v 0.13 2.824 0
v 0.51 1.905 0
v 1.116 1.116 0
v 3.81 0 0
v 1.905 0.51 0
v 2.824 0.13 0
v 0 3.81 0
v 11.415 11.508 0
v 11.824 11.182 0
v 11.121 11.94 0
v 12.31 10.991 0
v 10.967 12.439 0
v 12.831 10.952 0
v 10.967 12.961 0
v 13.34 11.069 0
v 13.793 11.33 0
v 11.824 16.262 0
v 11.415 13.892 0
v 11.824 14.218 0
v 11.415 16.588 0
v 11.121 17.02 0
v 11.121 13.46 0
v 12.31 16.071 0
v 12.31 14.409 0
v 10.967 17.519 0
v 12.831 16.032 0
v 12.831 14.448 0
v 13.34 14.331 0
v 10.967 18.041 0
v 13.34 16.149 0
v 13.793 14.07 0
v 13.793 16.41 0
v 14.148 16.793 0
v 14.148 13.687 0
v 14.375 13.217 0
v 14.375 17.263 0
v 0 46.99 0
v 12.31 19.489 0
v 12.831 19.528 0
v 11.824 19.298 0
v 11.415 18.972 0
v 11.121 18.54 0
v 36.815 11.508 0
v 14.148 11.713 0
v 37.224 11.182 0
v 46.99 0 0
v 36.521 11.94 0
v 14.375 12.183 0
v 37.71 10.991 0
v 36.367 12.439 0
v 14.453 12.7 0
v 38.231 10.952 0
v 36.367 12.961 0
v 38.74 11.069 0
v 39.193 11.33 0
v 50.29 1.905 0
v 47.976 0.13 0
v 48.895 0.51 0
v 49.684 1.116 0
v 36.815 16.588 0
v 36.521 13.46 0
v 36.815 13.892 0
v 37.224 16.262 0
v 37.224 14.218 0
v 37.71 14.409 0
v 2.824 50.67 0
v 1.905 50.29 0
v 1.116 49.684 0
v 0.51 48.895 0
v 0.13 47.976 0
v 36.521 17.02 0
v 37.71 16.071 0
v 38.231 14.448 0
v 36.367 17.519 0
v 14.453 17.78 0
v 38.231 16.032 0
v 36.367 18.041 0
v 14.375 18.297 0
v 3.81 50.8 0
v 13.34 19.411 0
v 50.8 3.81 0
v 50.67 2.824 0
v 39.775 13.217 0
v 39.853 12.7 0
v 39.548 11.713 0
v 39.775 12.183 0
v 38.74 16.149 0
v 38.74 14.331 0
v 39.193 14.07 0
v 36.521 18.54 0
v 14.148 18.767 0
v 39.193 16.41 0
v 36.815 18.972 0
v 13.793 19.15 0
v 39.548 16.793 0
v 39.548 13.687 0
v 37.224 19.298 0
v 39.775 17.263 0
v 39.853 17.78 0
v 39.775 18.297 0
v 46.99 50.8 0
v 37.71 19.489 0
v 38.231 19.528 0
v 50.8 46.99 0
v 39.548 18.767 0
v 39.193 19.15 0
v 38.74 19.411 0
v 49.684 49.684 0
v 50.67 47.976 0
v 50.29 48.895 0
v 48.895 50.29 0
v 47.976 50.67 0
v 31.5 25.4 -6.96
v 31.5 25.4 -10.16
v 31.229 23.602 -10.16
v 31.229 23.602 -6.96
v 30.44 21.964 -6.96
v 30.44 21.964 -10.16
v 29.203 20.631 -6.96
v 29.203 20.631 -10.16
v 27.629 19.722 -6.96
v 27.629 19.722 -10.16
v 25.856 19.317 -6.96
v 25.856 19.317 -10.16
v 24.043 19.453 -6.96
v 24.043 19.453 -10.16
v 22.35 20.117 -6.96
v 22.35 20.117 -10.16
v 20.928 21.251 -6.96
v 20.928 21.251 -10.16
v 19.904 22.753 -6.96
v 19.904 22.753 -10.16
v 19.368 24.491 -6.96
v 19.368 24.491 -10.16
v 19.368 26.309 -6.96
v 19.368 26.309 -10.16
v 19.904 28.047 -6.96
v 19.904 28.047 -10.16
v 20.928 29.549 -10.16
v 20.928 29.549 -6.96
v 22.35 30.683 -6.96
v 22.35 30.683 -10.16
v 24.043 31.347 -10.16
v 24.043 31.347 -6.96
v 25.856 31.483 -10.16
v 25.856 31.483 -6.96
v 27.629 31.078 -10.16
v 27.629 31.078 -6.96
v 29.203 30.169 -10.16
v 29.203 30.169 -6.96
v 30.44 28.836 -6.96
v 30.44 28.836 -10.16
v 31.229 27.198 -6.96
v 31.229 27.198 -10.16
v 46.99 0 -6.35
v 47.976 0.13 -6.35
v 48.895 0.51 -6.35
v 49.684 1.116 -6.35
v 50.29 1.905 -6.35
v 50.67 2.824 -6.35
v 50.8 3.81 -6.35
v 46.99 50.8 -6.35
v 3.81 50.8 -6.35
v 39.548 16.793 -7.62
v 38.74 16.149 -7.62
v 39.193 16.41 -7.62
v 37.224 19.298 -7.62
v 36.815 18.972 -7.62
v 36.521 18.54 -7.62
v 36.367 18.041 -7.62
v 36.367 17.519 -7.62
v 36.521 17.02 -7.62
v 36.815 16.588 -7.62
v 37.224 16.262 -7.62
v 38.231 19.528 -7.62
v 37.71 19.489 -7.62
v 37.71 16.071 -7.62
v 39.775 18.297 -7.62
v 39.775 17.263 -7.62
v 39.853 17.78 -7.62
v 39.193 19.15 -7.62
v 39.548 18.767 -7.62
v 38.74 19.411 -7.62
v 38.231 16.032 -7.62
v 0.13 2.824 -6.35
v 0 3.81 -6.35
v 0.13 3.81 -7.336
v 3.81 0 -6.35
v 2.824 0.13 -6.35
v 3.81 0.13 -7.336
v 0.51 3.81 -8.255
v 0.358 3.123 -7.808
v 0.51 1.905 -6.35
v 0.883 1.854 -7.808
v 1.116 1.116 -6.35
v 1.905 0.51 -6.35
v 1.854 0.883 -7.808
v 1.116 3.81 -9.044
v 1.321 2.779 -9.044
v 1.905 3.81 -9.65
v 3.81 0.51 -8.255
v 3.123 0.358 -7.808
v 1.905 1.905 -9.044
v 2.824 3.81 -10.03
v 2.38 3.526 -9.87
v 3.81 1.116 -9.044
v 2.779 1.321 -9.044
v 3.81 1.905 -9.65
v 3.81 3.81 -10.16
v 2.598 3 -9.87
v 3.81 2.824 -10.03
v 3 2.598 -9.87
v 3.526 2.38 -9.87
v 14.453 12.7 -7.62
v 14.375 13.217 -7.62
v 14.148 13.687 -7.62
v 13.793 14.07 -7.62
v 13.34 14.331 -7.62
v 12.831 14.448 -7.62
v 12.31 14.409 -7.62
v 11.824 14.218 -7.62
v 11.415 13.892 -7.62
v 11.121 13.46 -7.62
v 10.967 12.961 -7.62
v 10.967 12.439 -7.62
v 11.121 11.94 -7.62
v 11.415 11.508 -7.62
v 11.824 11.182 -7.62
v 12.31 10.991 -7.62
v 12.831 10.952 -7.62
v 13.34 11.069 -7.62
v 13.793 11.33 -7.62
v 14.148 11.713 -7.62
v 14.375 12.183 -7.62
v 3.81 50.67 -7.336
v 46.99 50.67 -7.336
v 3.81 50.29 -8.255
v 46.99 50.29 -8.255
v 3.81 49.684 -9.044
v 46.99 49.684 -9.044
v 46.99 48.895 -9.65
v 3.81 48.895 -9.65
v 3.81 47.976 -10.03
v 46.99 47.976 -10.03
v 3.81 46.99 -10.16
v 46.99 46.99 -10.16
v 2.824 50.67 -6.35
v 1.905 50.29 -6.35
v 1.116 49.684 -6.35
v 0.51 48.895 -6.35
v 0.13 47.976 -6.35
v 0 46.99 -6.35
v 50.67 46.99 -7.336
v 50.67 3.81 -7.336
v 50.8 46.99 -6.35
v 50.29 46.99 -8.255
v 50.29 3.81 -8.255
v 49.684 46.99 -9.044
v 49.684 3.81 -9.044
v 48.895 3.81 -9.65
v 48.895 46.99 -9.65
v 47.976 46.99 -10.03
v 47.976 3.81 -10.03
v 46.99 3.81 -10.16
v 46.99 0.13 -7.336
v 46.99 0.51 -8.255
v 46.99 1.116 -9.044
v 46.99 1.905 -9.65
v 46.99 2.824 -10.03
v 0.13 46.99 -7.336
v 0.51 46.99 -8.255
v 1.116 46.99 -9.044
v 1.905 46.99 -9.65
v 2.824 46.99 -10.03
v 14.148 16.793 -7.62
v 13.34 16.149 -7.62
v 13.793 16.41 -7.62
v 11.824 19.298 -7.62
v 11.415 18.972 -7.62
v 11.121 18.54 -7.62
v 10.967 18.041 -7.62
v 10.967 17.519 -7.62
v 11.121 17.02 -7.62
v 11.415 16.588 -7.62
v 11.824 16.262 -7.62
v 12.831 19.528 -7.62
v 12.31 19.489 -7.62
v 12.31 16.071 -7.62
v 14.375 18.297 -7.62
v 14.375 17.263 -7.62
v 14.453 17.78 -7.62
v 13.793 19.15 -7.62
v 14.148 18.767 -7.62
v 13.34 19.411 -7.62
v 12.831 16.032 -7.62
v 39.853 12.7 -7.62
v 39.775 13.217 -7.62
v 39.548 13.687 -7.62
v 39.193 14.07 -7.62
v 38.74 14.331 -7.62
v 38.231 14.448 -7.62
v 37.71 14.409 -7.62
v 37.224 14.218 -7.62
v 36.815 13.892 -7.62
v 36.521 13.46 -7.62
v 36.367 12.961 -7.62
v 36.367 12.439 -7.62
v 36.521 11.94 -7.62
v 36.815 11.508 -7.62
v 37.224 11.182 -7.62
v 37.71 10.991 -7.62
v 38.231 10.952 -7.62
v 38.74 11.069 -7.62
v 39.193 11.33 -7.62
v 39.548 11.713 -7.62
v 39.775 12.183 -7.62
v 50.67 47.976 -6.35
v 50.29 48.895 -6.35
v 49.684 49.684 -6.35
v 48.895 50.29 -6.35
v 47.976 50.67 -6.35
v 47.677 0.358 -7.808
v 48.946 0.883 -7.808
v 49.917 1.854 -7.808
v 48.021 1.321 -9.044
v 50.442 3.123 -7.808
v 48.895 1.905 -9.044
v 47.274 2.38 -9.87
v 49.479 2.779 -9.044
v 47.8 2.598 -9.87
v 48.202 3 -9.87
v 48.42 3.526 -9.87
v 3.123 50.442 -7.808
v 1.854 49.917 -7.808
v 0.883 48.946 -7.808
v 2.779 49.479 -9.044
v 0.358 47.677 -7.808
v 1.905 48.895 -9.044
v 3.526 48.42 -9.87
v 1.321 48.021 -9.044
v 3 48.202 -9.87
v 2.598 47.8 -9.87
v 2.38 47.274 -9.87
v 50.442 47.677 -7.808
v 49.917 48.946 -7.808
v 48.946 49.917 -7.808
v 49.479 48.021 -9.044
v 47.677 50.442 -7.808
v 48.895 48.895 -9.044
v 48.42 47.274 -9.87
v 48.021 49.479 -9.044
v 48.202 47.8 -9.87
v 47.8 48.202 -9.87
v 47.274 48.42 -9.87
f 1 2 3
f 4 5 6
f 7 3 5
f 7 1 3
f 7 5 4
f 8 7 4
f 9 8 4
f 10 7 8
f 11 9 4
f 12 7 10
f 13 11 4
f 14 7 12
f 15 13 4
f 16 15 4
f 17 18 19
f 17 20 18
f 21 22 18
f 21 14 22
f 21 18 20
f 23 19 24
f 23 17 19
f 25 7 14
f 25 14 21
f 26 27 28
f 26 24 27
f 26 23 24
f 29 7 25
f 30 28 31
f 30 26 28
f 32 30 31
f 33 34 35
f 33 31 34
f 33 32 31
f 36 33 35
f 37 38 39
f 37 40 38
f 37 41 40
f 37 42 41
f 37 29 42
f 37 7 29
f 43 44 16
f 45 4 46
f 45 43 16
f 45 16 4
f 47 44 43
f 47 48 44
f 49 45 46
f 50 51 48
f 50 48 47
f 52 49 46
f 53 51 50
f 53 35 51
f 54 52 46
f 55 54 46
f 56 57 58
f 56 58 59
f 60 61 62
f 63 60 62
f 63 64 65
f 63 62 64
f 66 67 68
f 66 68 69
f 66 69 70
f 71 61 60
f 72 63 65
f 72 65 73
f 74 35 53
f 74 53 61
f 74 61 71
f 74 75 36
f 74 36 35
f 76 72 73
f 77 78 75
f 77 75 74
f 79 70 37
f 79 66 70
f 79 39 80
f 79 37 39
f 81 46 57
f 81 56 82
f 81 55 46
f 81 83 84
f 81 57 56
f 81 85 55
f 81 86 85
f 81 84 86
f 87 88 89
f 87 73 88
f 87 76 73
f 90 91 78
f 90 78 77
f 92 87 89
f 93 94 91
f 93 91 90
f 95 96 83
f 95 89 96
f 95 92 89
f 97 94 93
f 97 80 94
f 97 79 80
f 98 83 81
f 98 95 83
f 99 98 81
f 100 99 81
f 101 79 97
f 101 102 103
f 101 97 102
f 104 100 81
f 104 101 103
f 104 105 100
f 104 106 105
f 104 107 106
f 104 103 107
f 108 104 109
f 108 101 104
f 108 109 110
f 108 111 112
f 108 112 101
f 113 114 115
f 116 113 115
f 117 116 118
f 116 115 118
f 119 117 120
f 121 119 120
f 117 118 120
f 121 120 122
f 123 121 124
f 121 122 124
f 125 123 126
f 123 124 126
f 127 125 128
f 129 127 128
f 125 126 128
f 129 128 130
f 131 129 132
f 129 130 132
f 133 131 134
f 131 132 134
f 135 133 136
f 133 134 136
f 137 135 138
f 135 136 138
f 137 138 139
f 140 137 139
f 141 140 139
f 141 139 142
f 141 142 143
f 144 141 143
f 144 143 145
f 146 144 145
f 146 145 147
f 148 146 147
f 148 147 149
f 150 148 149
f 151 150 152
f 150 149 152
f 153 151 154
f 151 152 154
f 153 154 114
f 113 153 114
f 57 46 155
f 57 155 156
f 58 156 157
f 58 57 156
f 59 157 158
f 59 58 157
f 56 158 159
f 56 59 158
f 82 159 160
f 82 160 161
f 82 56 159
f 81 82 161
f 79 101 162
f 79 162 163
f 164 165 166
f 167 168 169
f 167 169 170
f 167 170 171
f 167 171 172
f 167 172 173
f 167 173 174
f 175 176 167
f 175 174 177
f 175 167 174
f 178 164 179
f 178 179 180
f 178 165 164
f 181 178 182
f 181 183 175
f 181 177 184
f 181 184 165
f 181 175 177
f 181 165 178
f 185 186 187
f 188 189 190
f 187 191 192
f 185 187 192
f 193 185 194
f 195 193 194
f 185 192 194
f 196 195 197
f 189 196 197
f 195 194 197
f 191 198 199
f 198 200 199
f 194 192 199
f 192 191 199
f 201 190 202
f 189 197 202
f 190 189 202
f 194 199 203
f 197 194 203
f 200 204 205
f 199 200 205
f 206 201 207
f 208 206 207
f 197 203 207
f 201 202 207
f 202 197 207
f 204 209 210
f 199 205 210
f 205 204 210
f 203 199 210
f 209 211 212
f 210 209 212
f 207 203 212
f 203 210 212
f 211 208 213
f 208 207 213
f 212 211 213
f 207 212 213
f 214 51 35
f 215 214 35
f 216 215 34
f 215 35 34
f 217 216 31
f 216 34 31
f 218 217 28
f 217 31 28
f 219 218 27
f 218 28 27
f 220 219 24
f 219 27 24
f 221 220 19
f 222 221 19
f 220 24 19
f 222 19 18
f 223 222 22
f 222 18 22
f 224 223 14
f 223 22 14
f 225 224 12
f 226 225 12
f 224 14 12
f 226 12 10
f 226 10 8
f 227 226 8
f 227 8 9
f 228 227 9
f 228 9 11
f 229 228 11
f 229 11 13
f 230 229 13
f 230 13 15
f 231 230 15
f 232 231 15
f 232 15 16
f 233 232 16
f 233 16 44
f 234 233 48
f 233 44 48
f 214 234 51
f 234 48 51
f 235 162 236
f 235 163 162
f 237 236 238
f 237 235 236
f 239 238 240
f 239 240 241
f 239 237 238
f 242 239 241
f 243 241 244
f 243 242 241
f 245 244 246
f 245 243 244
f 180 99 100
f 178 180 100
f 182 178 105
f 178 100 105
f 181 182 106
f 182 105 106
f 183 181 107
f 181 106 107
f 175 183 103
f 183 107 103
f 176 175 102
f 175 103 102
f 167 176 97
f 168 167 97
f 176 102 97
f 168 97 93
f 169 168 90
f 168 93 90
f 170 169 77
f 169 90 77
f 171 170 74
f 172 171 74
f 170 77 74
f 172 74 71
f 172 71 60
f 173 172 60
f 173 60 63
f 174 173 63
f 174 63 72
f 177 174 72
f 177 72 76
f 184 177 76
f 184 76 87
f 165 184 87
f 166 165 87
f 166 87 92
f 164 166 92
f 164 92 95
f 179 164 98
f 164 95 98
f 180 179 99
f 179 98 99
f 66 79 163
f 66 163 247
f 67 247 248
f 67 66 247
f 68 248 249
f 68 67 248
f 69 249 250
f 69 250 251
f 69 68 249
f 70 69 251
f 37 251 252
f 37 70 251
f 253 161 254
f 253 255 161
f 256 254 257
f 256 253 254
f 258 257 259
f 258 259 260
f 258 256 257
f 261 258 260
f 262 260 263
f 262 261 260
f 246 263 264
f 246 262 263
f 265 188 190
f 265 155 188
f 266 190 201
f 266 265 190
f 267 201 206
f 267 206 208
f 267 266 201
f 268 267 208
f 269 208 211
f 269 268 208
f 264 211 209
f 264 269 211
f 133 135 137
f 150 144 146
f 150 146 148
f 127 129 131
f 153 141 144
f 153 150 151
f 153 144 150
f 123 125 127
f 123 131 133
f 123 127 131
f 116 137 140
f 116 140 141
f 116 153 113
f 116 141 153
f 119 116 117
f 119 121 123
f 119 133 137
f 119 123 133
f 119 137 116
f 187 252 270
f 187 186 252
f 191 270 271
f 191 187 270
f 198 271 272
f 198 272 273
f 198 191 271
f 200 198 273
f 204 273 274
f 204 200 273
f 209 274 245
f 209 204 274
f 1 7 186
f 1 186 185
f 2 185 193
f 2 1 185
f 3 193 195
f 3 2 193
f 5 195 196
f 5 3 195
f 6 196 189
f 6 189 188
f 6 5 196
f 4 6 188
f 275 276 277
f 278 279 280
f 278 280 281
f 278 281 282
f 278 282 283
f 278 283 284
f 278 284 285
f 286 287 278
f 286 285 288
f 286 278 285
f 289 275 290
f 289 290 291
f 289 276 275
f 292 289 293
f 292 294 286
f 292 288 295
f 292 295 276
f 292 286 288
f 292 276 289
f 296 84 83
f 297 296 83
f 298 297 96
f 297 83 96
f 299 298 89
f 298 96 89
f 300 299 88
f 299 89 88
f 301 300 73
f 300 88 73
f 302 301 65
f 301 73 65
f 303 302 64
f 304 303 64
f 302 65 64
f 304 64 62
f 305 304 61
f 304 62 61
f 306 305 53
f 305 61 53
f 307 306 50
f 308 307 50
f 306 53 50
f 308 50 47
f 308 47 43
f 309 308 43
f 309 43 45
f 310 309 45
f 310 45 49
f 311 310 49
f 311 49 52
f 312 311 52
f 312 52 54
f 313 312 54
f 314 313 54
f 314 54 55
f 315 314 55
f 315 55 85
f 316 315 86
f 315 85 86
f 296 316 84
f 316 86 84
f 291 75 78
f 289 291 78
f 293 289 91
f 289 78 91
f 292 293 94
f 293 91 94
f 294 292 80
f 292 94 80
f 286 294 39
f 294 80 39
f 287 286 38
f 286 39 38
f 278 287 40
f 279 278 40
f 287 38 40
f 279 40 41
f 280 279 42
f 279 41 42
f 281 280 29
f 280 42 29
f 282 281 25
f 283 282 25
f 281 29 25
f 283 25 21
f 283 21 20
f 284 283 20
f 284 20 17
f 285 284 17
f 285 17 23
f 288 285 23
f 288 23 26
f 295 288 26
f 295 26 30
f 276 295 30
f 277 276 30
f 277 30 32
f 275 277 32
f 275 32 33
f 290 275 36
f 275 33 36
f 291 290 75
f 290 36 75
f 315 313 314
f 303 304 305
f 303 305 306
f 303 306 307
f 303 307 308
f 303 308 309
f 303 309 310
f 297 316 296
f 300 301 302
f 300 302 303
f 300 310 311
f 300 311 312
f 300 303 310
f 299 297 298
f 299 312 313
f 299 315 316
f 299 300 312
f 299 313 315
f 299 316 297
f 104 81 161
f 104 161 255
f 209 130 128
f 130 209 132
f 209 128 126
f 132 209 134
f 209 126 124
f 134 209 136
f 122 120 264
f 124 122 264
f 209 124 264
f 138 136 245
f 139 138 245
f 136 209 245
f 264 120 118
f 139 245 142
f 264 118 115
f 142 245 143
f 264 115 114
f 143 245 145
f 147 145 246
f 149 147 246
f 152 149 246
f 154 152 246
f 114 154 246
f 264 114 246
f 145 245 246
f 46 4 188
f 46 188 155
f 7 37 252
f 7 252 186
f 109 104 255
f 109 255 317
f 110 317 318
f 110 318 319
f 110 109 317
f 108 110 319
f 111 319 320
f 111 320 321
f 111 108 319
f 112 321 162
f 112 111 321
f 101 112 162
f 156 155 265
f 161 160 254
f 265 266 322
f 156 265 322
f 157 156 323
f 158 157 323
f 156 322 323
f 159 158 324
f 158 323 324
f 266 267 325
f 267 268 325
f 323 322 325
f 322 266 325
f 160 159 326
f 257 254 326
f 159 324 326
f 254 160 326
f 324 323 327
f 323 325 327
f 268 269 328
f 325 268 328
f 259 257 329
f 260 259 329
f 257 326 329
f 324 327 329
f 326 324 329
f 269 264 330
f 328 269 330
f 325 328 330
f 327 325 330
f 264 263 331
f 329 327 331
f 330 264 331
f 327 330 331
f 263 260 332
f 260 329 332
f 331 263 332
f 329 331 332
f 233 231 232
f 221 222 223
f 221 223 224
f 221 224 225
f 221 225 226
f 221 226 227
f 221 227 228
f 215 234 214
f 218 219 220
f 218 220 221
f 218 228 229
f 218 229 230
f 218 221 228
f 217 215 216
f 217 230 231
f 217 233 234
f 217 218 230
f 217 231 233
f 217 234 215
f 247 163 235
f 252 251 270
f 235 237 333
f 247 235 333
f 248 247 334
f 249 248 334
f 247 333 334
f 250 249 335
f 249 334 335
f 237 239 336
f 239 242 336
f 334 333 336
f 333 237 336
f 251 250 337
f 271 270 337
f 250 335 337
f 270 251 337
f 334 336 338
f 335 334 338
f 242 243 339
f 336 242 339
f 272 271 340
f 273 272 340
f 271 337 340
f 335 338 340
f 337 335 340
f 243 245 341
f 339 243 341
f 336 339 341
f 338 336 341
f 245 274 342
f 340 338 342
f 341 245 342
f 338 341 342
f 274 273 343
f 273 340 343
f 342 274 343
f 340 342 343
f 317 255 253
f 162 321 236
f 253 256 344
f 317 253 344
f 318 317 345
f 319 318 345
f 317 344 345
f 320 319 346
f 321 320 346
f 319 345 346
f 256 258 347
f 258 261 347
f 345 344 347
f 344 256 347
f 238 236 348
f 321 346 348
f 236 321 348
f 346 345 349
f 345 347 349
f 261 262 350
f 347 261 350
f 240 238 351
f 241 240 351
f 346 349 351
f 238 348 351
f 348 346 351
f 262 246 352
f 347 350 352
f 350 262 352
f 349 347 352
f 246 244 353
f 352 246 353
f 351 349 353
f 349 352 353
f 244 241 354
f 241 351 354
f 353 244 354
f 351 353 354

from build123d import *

# Parameters (mm, degrees)
F0_R     = 1.7526
F1_DEPTH = 10.16
F2_DEPTH = 7.62
F3_R     = 6.1
F4_DEPTH = 3.2
F5_R     = 3.81


with BuildPart() as f1:
    # F0 (on Top) → F1 (new body)
    with BuildSketch(Plane.XY):
        with BuildLine():
            ThreePointArc((0, 3.81), (1.1159231637, 1.1159231637), (3.81, 0))
            Line((3.81, 0), (46.99, 0))
            ThreePointArc((46.99, 0), (49.6840768363, 1.1159231637), (50.8, 3.81))
            Line((50.8, 3.81), (50.8, 46.99))
            ThreePointArc((50.8, 46.99), (49.6840768363, 49.6840768363), (46.99, 50.8))
            Line((46.99, 50.8), (3.81, 50.8))
            ThreePointArc((3.81, 50.8), (1.1159231637, 49.6840768363), (0, 46.99))
            Line((0, 46.99), (0, 3.81))
        make_face()
        with Locations((12.7, 12.7)):
            Circle(F0_R, mode=Mode.SUBTRACT)
        with Locations((12.7, 17.78)):
            Circle(F0_R, mode=Mode.SUBTRACT)
        with Locations((38.1, 12.7)):
            Circle(F0_R, mode=Mode.SUBTRACT)
        with Locations((38.1, 17.78)):
            Circle(F0_R, mode=Mode.SUBTRACT)
        with Locations((12.7, 17.78)):
            Circle(F0_R)
        with Locations((38.1, 17.78)):
            Circle(F0_R)
        with Locations((12.7, 12.7)):
            Circle(F0_R)
        with Locations((38.1, 12.7)):
            Circle(F0_R)
    extrude(amount=-F1_DEPTH)

    # F0 (on Top) → F2 (cut)
    with BuildSketch(Plane.XY):
        with Locations((12.7, 17.78)):
            Circle(F0_R)
        with Locations((38.1, 17.78)):
            Circle(F0_R)
        with Locations((38.1, 12.7)):
            Circle(F0_R)
        with Locations((12.7, 12.7)):
            Circle(F0_R)
    extrude(amount=-F2_DEPTH, mode=Mode.SUBTRACT)

    # F3 (on face) → F4 (cut)
    with BuildSketch(Plane(origin=(0, 0, -10.16), x_dir=(1, 0, 0), z_dir=(0, 0, -1))):
        with Locations((25.4, -25.4)):
            Circle(F3_R)
    extrude(amount=-F4_DEPTH, mode=Mode.SUBTRACT)

    # F5
    f5_edges = [f1.edges().sort_by_distance(p)[0] for p in [
        (25.4, 0, -10.16),
    ]]
    fillet(f5_edges, radius=F5_R)


solid = f1.part
